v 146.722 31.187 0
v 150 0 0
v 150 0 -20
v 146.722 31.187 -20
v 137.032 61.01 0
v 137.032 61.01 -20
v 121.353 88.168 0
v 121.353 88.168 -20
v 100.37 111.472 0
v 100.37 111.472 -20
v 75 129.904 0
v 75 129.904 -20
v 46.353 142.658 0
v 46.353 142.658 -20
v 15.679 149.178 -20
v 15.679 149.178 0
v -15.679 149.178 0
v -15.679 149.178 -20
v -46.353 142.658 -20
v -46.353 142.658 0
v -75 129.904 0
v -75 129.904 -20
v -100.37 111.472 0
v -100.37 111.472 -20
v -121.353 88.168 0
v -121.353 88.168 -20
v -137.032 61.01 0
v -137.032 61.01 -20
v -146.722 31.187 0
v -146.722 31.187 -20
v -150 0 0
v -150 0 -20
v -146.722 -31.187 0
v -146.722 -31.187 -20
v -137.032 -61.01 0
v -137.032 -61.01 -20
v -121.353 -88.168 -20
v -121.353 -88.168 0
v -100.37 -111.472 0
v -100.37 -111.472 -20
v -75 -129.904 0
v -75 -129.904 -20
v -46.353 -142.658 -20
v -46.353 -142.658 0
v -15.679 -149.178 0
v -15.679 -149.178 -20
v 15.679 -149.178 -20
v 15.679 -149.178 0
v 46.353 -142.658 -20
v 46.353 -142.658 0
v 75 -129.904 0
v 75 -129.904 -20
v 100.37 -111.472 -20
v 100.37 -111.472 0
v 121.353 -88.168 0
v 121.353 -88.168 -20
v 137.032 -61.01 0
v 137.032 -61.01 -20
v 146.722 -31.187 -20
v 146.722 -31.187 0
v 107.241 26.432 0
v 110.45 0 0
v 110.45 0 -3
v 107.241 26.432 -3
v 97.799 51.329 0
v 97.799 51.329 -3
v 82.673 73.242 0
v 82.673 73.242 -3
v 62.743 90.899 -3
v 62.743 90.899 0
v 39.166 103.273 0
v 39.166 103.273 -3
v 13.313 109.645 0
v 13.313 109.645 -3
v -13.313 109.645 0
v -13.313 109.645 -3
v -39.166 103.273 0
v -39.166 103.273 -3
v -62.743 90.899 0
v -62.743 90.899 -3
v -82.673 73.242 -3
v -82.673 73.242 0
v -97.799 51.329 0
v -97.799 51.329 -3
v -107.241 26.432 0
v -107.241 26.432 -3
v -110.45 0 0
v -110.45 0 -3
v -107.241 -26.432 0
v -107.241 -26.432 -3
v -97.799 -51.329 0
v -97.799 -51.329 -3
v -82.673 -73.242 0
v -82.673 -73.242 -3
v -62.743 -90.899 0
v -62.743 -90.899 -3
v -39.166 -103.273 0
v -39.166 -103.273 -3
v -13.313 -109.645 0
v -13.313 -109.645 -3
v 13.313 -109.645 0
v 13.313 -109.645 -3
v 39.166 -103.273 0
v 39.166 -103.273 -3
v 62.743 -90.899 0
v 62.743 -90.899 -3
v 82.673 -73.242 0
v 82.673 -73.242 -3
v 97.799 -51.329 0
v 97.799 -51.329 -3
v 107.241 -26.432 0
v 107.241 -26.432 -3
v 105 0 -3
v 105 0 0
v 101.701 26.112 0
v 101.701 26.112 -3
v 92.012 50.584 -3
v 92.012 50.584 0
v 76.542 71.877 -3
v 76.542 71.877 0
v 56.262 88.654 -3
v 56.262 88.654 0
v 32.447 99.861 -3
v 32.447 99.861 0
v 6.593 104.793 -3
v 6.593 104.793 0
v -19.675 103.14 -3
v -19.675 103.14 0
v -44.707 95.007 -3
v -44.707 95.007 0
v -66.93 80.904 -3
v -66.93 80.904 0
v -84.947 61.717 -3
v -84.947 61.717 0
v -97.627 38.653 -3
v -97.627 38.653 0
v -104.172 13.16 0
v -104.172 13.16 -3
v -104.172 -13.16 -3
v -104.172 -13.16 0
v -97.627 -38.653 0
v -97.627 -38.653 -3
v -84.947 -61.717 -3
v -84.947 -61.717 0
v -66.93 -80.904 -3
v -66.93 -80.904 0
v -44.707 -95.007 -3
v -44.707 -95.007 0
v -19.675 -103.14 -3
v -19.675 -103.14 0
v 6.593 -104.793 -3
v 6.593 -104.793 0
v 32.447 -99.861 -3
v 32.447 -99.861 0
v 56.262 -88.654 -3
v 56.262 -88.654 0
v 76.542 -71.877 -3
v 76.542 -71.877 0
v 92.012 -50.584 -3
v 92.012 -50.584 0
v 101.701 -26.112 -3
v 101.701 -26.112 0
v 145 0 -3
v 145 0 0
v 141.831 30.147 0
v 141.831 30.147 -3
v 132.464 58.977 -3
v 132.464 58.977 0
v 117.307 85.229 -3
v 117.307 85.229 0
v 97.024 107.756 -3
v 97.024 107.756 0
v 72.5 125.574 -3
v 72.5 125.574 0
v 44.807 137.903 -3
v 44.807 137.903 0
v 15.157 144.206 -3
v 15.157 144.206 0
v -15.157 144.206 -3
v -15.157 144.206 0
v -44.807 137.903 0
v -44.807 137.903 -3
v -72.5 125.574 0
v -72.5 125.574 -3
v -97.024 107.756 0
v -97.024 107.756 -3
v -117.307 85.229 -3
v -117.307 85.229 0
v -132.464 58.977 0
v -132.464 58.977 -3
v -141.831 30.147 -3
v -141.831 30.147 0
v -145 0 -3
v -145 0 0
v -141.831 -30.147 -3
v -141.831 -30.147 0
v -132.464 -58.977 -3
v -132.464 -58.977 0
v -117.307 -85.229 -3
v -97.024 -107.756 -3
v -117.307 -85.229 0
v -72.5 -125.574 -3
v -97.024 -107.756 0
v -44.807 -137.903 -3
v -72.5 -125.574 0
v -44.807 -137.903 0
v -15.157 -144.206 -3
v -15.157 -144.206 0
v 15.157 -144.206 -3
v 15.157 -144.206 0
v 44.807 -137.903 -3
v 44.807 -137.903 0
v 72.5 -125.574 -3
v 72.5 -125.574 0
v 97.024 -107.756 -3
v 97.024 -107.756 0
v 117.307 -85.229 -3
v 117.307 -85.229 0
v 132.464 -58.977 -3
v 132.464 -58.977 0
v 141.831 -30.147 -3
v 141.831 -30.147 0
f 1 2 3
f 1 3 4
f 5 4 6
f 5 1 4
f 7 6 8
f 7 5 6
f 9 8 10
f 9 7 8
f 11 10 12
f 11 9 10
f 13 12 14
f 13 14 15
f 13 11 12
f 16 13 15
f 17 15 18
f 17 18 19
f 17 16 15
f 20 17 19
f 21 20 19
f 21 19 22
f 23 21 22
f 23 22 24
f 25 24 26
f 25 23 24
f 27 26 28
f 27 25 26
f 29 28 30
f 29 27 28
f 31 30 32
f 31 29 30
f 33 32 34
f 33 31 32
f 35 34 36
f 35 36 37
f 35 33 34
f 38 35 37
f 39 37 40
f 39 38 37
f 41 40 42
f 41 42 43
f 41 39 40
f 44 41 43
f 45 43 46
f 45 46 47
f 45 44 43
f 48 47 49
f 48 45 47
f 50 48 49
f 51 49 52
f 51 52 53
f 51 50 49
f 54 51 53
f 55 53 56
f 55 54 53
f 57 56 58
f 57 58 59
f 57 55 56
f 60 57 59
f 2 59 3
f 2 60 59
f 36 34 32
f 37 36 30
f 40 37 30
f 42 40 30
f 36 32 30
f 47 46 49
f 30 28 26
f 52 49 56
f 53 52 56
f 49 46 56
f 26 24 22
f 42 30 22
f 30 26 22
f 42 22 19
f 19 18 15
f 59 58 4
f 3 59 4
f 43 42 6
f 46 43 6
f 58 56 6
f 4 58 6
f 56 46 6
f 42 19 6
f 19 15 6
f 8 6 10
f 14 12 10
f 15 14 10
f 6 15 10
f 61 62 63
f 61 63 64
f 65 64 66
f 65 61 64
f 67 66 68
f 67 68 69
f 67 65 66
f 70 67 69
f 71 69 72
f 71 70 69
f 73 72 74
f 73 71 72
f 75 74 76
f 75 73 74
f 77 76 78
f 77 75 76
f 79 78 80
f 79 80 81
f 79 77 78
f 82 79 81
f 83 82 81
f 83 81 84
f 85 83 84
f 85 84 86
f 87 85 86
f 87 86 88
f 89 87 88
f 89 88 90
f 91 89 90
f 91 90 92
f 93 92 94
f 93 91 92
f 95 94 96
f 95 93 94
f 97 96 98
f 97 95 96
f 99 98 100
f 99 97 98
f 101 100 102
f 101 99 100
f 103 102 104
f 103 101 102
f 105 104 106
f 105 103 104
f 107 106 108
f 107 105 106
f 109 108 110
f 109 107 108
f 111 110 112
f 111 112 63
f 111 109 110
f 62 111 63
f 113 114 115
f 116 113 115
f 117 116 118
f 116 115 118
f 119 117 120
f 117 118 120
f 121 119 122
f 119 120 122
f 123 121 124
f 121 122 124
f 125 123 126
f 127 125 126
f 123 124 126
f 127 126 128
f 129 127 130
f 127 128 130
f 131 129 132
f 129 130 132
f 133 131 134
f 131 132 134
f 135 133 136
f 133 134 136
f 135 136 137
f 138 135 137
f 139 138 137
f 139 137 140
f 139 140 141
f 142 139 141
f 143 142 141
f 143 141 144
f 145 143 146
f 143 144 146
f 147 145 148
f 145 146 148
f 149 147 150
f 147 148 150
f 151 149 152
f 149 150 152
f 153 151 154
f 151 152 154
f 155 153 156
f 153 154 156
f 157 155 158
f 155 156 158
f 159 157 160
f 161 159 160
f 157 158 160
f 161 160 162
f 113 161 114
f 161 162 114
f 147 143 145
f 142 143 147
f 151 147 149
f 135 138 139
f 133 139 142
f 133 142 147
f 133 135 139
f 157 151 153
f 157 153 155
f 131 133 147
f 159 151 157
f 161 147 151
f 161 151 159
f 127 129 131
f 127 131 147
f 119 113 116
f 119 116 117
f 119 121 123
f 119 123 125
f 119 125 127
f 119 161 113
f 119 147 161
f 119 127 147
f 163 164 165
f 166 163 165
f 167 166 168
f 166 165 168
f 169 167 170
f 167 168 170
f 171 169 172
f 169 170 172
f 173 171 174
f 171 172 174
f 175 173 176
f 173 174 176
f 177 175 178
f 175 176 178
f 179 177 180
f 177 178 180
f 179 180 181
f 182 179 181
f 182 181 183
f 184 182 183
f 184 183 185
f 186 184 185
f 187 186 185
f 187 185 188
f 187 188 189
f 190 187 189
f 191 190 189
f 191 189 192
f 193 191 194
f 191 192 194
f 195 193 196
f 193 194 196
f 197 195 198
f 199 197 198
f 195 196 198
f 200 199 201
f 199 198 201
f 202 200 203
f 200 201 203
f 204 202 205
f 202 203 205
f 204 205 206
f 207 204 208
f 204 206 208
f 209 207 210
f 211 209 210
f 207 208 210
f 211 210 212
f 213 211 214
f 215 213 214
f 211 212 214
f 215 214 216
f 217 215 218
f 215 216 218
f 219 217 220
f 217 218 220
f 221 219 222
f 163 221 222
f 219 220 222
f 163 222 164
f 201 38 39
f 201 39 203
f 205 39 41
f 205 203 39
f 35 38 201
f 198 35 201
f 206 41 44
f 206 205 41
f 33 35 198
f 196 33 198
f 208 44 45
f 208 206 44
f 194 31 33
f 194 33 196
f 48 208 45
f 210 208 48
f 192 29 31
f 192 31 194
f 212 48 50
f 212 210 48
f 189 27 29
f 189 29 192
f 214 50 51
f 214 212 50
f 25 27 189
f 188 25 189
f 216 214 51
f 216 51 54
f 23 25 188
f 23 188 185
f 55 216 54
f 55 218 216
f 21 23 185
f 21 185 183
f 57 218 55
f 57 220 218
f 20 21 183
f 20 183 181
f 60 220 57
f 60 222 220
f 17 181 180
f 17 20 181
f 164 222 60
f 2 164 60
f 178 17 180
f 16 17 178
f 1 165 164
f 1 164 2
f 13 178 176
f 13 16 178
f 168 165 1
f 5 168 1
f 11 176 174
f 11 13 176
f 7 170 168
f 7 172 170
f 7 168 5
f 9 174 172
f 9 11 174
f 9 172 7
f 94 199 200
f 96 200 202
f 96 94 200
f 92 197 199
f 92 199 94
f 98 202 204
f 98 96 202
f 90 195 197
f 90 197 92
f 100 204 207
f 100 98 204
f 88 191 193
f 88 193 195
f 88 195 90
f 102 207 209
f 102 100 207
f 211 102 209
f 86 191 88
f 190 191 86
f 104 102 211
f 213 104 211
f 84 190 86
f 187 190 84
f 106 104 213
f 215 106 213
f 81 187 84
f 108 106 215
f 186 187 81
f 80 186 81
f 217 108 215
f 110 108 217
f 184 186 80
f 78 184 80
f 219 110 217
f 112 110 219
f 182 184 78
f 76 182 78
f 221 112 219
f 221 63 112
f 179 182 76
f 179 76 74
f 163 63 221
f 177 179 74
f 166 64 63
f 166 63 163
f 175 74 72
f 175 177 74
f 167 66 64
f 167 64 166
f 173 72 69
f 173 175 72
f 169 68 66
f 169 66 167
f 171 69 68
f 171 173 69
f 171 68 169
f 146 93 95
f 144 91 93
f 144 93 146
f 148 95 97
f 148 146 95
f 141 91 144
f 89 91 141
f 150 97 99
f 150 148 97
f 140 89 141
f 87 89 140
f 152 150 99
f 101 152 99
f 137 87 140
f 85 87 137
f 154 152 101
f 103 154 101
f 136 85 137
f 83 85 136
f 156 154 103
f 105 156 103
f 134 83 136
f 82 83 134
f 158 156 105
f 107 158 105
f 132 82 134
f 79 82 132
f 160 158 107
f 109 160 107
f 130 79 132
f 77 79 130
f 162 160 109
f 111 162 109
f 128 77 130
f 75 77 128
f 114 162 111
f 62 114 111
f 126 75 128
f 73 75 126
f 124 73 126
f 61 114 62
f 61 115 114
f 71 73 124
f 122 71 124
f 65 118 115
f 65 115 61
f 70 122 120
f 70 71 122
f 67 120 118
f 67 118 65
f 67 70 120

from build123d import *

# Parameters (mm, degrees)
SKETCH_R        = 150
PAD_DEPTH       = 20
SKETCH001_R     = 145
SKETCH001_R_2   = 110.45
POCKET_DEPTH    = 3
SKETCH002_R     = 105
POCKET001_DEPTH = 3


with BuildPart() as part:
    # Sketch → Pad (new body)
    with BuildSketch(Plane.XY):
        Circle(SKETCH_R)
    extrude(amount=-PAD_DEPTH)

    # Sketch001 → Pocket (cut)
    with BuildSketch(Plane.XY):
        Circle(SKETCH001_R)
        Circle(SKETCH001_R_2, mode=Mode.SUBTRACT)
    extrude(amount=-POCKET_DEPTH, mode=Mode.SUBTRACT)

    # Sketch002 → Pocket001 (cut)
    with BuildSketch(Plane.XY):
        Circle(SKETCH002_R)
    extrude(amount=-POCKET001_DEPTH, mode=Mode.SUBTRACT)


solid = part.part
